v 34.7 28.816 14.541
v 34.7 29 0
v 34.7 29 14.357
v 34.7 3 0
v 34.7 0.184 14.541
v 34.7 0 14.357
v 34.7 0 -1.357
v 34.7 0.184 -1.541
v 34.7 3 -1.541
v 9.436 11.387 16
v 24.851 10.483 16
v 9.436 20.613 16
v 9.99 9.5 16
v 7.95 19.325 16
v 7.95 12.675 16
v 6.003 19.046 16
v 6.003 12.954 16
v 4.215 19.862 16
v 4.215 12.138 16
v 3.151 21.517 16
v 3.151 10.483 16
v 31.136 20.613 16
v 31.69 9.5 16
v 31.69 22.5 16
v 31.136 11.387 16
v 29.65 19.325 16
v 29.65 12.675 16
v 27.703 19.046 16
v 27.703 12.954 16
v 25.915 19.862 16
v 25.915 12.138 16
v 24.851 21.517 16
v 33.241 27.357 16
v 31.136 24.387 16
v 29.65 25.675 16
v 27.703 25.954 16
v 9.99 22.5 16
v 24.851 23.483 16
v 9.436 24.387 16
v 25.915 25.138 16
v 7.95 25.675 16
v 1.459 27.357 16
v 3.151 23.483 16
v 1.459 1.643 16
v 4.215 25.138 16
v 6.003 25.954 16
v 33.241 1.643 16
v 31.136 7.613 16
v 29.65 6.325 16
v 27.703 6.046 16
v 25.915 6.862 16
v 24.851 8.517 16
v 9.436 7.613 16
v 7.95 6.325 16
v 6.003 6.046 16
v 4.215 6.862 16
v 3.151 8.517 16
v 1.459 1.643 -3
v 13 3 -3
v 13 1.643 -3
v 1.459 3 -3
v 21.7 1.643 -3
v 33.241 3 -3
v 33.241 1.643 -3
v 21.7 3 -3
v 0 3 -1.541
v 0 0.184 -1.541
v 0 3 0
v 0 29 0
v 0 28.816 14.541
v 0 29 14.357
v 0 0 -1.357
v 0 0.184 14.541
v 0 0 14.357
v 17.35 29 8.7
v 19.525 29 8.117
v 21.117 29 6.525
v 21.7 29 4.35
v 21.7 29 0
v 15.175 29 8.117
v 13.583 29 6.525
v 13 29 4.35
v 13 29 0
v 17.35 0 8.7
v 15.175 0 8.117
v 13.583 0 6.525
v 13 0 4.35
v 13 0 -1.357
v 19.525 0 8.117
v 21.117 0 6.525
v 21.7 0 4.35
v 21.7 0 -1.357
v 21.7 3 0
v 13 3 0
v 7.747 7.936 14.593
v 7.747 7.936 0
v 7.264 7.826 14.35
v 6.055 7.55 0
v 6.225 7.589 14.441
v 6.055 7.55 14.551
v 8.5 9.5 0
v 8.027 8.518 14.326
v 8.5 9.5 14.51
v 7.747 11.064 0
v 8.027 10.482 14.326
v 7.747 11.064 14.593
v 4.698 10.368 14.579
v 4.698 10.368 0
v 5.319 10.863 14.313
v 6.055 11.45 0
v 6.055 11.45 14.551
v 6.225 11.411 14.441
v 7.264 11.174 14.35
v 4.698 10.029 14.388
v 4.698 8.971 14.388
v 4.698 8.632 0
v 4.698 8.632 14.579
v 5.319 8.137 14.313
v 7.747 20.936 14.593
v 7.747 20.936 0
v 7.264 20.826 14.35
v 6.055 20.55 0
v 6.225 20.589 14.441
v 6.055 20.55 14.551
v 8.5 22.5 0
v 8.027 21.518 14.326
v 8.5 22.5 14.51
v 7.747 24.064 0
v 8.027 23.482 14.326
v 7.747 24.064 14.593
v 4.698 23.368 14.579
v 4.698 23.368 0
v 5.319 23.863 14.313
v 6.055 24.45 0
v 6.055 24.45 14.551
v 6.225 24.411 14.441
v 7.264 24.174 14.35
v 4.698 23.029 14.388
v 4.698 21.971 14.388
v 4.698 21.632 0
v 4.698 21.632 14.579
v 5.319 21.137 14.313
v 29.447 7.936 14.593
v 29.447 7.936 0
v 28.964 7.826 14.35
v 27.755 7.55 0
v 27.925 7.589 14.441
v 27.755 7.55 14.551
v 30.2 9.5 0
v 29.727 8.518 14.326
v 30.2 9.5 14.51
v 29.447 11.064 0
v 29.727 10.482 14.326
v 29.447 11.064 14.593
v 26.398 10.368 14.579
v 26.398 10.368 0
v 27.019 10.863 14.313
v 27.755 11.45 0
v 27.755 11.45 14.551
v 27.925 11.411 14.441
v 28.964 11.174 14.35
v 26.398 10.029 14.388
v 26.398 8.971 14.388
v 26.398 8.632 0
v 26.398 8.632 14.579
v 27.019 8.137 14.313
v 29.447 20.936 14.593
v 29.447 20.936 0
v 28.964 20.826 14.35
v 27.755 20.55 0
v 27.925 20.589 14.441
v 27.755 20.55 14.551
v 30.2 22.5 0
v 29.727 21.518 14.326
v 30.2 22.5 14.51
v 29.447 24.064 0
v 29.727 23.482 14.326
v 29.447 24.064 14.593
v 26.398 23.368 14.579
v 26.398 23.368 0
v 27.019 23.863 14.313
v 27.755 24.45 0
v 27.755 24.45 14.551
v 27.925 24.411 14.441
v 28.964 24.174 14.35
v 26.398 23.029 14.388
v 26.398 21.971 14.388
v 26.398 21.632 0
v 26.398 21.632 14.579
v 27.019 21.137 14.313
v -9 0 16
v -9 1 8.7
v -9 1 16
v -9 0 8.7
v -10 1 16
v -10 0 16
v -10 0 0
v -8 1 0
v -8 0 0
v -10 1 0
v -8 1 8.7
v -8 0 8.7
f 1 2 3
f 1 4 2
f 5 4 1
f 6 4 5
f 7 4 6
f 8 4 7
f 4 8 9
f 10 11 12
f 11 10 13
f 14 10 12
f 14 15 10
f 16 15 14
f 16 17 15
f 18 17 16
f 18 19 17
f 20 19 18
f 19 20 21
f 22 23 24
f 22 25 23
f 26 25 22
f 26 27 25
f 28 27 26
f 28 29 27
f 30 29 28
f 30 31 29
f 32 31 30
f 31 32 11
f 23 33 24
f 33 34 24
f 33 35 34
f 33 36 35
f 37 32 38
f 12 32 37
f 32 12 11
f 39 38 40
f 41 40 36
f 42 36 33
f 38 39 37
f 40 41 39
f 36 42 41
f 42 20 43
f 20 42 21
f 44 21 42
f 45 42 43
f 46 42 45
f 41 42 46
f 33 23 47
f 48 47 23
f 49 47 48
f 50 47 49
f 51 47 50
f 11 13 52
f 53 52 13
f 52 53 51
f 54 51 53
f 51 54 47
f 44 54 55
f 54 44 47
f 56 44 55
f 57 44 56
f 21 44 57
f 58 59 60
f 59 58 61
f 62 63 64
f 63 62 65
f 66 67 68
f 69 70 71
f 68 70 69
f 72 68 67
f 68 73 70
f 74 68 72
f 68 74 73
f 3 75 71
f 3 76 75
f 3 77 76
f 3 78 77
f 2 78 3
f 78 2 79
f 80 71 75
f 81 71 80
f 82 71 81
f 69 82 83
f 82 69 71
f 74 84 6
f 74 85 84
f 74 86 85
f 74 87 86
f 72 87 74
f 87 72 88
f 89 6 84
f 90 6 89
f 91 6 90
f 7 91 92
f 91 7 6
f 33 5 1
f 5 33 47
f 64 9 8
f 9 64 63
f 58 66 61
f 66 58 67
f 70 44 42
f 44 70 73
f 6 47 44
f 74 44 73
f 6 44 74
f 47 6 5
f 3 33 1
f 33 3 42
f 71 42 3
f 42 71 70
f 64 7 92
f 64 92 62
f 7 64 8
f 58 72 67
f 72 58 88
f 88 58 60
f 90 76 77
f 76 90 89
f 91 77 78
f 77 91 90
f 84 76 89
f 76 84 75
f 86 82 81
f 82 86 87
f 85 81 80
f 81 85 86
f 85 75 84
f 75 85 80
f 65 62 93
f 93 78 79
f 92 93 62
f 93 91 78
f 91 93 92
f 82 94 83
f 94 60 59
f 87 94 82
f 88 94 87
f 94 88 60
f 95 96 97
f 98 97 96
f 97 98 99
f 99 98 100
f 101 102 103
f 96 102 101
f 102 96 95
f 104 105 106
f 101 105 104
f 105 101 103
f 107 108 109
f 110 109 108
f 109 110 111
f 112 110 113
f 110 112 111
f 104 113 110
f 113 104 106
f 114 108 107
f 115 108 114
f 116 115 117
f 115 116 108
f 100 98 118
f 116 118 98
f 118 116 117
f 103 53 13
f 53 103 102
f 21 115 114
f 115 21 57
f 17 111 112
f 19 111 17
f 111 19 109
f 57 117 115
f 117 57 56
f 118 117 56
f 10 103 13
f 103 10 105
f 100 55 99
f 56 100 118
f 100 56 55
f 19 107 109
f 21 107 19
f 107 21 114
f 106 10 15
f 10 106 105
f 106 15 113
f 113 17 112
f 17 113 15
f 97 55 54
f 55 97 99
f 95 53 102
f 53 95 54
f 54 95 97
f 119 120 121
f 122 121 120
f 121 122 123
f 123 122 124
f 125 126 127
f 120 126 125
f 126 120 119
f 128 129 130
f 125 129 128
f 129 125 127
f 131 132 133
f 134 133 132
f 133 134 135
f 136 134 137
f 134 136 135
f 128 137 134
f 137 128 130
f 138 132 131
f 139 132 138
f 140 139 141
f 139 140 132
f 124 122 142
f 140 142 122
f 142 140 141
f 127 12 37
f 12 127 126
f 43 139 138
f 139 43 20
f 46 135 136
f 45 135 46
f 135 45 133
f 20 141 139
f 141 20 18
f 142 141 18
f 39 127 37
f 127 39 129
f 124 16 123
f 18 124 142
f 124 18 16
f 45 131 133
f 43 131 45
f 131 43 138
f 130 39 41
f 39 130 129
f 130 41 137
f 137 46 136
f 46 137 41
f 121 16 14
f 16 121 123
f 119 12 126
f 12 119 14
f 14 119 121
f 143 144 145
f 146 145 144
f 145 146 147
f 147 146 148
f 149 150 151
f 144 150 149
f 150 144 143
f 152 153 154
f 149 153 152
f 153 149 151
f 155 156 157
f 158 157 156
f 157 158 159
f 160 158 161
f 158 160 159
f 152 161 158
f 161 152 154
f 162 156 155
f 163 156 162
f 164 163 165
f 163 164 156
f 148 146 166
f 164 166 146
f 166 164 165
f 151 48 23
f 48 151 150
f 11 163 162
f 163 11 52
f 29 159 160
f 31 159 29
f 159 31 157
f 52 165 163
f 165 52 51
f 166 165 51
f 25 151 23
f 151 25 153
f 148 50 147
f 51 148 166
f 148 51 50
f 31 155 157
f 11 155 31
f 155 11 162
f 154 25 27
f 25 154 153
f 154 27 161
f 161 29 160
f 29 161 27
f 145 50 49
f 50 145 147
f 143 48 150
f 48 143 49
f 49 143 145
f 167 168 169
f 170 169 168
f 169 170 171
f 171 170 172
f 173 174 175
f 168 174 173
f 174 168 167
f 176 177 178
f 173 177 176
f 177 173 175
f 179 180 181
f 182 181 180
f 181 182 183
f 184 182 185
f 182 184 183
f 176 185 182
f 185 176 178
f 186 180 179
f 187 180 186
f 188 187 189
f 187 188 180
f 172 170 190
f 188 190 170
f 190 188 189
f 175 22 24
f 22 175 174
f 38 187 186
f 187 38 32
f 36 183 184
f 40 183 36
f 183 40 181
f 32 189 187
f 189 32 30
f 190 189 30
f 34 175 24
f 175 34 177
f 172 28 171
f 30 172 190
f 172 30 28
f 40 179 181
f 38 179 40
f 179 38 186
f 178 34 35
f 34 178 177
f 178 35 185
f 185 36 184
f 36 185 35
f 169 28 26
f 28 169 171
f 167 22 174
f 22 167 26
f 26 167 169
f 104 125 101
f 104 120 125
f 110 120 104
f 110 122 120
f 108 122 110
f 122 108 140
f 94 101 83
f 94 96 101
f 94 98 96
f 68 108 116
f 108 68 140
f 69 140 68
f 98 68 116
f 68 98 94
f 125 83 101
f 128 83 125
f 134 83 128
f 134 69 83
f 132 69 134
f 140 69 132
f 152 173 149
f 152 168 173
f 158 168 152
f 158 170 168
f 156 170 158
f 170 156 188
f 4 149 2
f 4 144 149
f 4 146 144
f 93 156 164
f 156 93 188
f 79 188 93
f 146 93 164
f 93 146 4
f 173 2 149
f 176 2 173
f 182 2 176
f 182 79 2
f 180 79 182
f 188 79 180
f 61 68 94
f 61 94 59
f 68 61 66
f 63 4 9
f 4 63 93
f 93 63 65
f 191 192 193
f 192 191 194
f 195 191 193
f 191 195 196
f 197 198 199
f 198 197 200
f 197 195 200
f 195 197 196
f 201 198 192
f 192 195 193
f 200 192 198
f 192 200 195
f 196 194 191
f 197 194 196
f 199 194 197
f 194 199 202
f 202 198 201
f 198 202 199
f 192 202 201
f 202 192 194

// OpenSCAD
// file: inc/functions.scad
// PRUSA iteration3
// Functions used in many files
// GNU GPL v3
// Josef Průša <josefprusa@me.com>
// Václav 'ax' Hůla <axtheb@gmail.com>
// Vlnofka <>
// http://www.reprap.org/wiki/Prusa_Mendel
// http://github.com/prusajr/PrusaMendel


module nut(d,h,horizontal=true){
    cornerdiameter =  (d / 2) / cos (180 / 6);
    cylinder(h = h, r = cornerdiameter, $fn = 6);
    if(horizontal){
        for(i = [1:6]){
            rotate([0,0,60*i]) translate([-cornerdiameter-0.2,0,0]) rotate([0,0,-45]) cube([2,2,h]);
        }
    }
}

// Based on nophead research
module polyhole(d, h, center=false) {
    n = max(round(2 * d),3);
    rotate([0,0,180])
        cylinder(h = h, r = (d / 2) / cos (180 / n), $fn = n);
}

// make it interchangeable between this and cylinder
module cylinder_poly(r, h, center=false){
    polyhole(d=r*2, h=h, center=center);
}

module fillet(radius, height=100, $fn=0) {
    //this creates acutal fillet
    translate([-radius, -radius, -height/2-0.01])
        difference() {
            cube([radius*2, radius*2, height+0.02]);
            cylinder(r=radius, h=height+0.02, $fn=$fn);
        }
}

module cube_fillet(size, radius=-1, vertical=[3,3,3,3], top=[0,0,0,0], bottom=[0,0,0,0], center=false, $fn=0){
    //
    if (center) {
        cube_fillet_inside(size, radius, vertical, top, bottom, $fn);
    } else {
        translate([size[0]/2, size[1]/2, size[2]/2])
            cube_fillet_inside(size, radius, vertical, top, bottom, $fn);
    }
}

module cube_negative_fillet(size, radius=-1, vertical=[3,3,3,3], top=[0,0,0,0], bottom=[0,0,0,0], $fn=0){

    j=[1,0,1,0];

    for (i=[0:3]) {
        if (radius > -1) {
            rotate([0, 0, 90*i]) translate([size[1-j[i]]/2, size[j[i]]/2, 0]) fillet(radius, size[2], $fn=$fn);
        } else {
            rotate([0, 0, 90*i]) translate([size[1-j[i]]/2, size[j[i]]/2, 0]) fillet(vertical[i], size[2], $fn=$fn);
        }
        rotate([90*i, -90, 0]) translate([size[2]/2, size[j[i]]/2, 0 ]) fillet(top[i], size[1-j[i]], $fn=$fn);
        rotate([90*(4-i), 90, 0]) translate([size[2]/2, size[j[i]]/2, 0]) fillet(bottom[i], size[1-j[i]], $fn=$fn);

    }
}

module cube_fillet_inside(size, radius=-1, vertical=[3,3,3,3], top=[0,0,0,0], bottom=[0,0,0,0], $fn=0){
    //makes CENTERED cube with round corners
    // if you give it radius, it will fillet vertical corners.
    //othervise use vertical, top, bottom arrays
    //when viewed from top, it starts in upper right corner (+x,+y quadrant) , goes counterclockwise
    //top/bottom fillet starts in direction of Y axis and goes CCW too


    if (radius == 0) {
        cube(size, center=true);
    } else {
        difference() {
            cube(size, center=true);
            cube_negative_fillet(size, radius, vertical, top, bottom, $fn);
        }
    }
}


module nema17(places=[1,1,1,1], size=15.5, h=10, holes=false, shadow=false, $fn=24){
    for (i=[0:3]) {
        if (places[i] == 1) {
            rotate([0, 0, 90*i]) translate([size, size, 0]) {
                if (holes) {
                    #rotate([0, 0, -90*i])  translate([0,0,-10]) screw(r=1.7, slant=false, head_drop=13, $fn=$fn, h=h+12);
                } else {
                    rotate([0, 0, -90*i]) cylinder(h=h, r=5.5, $fn=$fn);
                }
            }
        }
    }
    if (shadow != false) {
        %translate ([0, 0, shadow+21+3]) cube([42,42,42], center = true);
    //flange
        %translate ([0, 0, shadow+21+3-21-1]) cylinder(r=11,h=2, center = true, $fn=20);
    //shaft
        %translate ([0, 0, shadow+21+3-21-7]) cylinder(r=2.5,h=14, center = true);
    }
}

module screw(h=20, r=2, r_head=3.5, head_drop=0, slant=true, poly=false, $fn=0){
    //makes screw with head
    //for substraction as screw hole
    if (poly) {
        cylinder_poly(h=h, r=r, $fn=$fn);
    } else {
        cylinder(h=h, r=r, $fn=$fn);
    }
    if (slant) {
        translate([0, 0, head_drop-0.01]) cylinder(h=r_head, r2=0, r1=r_head, $fn=$fn);
    }

    if (head_drop > 0) {
        translate([0, 0, -0.01]) cylinder(h=head_drop+0.01, r=r_head, $fn=$fn);
    }
}

//cube_fillet([10,20,30], vertical=[3,2,0,0], top=[3,2,0,5], bottom=[3,2,0,5]);
//cube_fillet([10,20,30], radius=2, top=[7,2,7,2]);
// file: inc/metric.scad
// PRUSA iteration3
// Default metric sizes
// GNU GPL v3
// Josef Průša <josefprusa@me.com>
// http://www.reprap.org/wiki/Prusa_Mendel
// http://github.com/prusajr/PrusaMendel

// DONT CHANGE THIS FILE! ALTER VALUES IN CONFIGURATION.SCAD INSTEAD

// RODS

threaded_rod_diameter = 8.7;
threaded_rod_diameter_horizontal = 8.7;
smooth_bar_diameter = 8;
smooth_bar_diameter_horizontal = 8.5;

// Nuts and bolts

m8_diameter = 9;
m8_nut_diameter = 14.1;

m4_diameter = 4.5;
m4_nut_diameter = 9;

m3_diameter = 3.6;
m3_nut_diameter = 5.3;
m3_nut_diameter_horizontal = 6.1;

// Bushing holder

bushing_core_diameter = smooth_bar_diameter;
bushing_material_thickness = 1;

// Motors

motor_shaft = 5.5;
// file: configuration.scad
// PRUSA Mendel  
// Configuration file
// GNU GPL v3
// Josef Průša
// josefprusa@me.com
// prusadjs.cz
// http://www.reprap.org/wiki/Prusa_Mendel
// http://github.com/prusajr/PrusaMendel

// PLEASE SELECT ONE OF THE CONFIGURATIONS BELOW
// BY UN-COMMENTING IT

// Uncomment for metric settings
// METRIC METRIC METRIC METRIC METRIC METRIC METRIC METRIC 

include <inc/metric.scad>;

// CUSTOM CUSTOM CUSTOM CUSTOM CUSTOM CUSTOM CUSTOM CUSTOM CUSTOM

thin_wall = 3;


// Linear bearing version
linear = false;
// set false for LM-8UU, true for LM-E-8UU (ignore if linear is set to false)
lme8uu = false;

//Machine dimensions

board_thickness = 16;
board_to_xz_distance = 26;

belt_tooth_distance = 2.5;
belt_tooth_stride = 0.5;

// CHANGE ONLY THE STUFF YOU KNOW
// IT WILL REPLACE DEFAULT SETTING

// RODS

// threaded_rod_diameter = 0;
// threaded_rod_diameter_horizontal = 0;
// smooth_bar_diameter = 0;
// smooth_bar_diameter_horizontal = 0;

// Nuts and bolts

// m8_diameter = 0;
// m8_nut_diameter = 0;

// m4_diameter = 0;
// m4_nut_diameter = 0;

// m3_diameter = 0;
// m3_nut_diameter = 0;

// Bushing holder

// bushing_core_diameter = smooth_bar_diameter;
// bushing_material_thickness = 0;


///counted stuff
m3_nut_diameter_bigger = ((m3_nut_diameter  / 2) / cos (180 / 6))*2;

// functions
include <inc/functions.scad>
// main file
include <configuration.scad>

module boltTrack(width, length, height) {
	hwidth = width / 2;
	hdiff = hwidth - height;
	union() {
		difference() {
			rotate([90, 0, 0])
				translate([hwidth, height, -length])
					cylinder(h=length, r=hwidth, $fn=12);
			
			if (height < hwidth) {
				translate([0, -1, height - hwidth - 1])
					cube([width, length + 2, hdiff + 1]);
			}
		}
		cube([width, length, height]);
	}
}


module yrodbracket(lip_thickness, lip_length) {
	innerRadius = threaded_rod_diameter / 2;
	outerRadius = innerRadius + lip_thickness;
	r_head = 3.5; // FIXME: stolen from screw() in inc/functions.scad
	r_screw = 2;
	screw_margin = r_head + 2;
	holeOuterDiameter = r_screw + screw_margin * 2;
	holeCenter = holeOuterDiameter / 2;
	width = threaded_rod_diameter + holeOuterDiameter * 2;
	middle = width / 2;
	height = outerRadius + innerRadius;

	depth = holeOuterDiameter * 2 + lip_thickness;

	function pythag(a, b) = sqrt(a * a + b * b);
	function bevelradius(x, y, bevel) = pythag(x, y) - bevel * max(x, y) / min(x, y);

	xzbevel = bevelradius(width, board_thickness, 2.0);
	yzbevel = bevelradius(depth, board_thickness, 2.0);
	difference() {
		union() {
			intersection() {
				cube([width, depth, board_thickness]);
				translate([width / 2, depth / 2, board_thickness / 2])
					rotate([0, 45, 0])
						cube([xzbevel, depth, xzbevel], center=true);
				translate([width / 2, depth / 2, board_thickness / 2])
					rotate([45, 0, 0])
						cube([width, yzbevel, yzbevel], center=true);
						
			}
			translate([0, 0, -lip_length])
				cube([width, lip_thickness, lip_length + lip_thickness]);
		}
		translate([holeOuterDiameter, -1, -lip_length - lip_thickness])
			boltTrack(threaded_rod_diameter, depth + 2, lip_length + lip_thickness + innerRadius);

		// screw holes
		for (x = [holeCenter, width - holeCenter]) {
			for (y = [lip_thickness + holeCenter, holeOuterDiameter + lip_thickness + holeCenter]) {
				translate([x, y, board_thickness])
					rotate([180, 0, 0])
						screw();
			}
		}
	}
}

module yrodbracket2(lip_thickness, lip_length) {
	innerRadius = threaded_rod_diameter / 2;
	outerRadius = innerRadius + lip_thickness;
	r_head = 3.5; // FIXME: stolen from screw() in inc/functions.scad
	r_screw = 2;
	screw_margin = r_head + 2;
	holeOuterDiameter = r_screw + screw_margin * 2;
	holeCenter = holeOuterDiameter / 2;
	width = threaded_rod_diameter + holeOuterDiameter * 2;
	middle = width / 2;
	height = outerRadius + innerRadius;

	depth = holeOuterDiameter * 2 + lip_thickness;

	function pythag(a, b) = sqrt(a * a + b * b);
	function bevelradius(x, y, bevel) = pythag(x, y) - bevel * max(x, y) / min(x, y);

	xzbevel = bevelradius(width, board_thickness + lip_length, 2.0);
	yzbevel = bevelradius(depth, board_thickness + lip_length, 2.0);
	bracket_thickness = board_thickness + lip_length;
	difference() {
		union() {
			intersection() {
				translate([0, 0, -lip_length])
					cube([width, depth, bracket_thickness]);
				translate([width / 2, depth / 2, bracket_thickness / 2 - lip_length])
					rotate([0, 45, 0])
						cube([xzbevel, depth, xzbevel], center=true);
				translate([width / 2, depth / 2, bracket_thickness / 2 - lip_length])
					rotate([45, 0, 0])
						cube([width, yzbevel, yzbevel], center=true);
			}
		}
		translate([holeOuterDiameter, -1, -lip_length - lip_thickness])
			boltTrack(threaded_rod_diameter, depth + 2, lip_length + lip_thickness + innerRadius);

		translate([-1, lip_thickness, -lip_length - 1])
			cube([width + 2, depth, lip_length + 1]);

		// screw holes
		for (x = [holeCenter, width - holeCenter]) {
			for (y = [lip_thickness + holeCenter, holeOuterDiameter + lip_thickness + holeCenter]) {
				translate([x, y, board_thickness])
					rotate([180, 0, 0])
						screw();
			}
		}
	}
}

translate([-10, 0, 0])
	color("blue")
		cube([1, 1, board_thickness]); // xxx: ruler
translate([-9, 0, 0])
	color("Red")
		cube([1, 1, threaded_rod_diameter]); // xxx: ruler

yrodbracket2(3, 3);
//rotate([90, 0, 0])
	//translate([3.5 + 6 + 3 + threaded_rod_diameter / 2, threaded_rod_diameter / 2, -50])
		//# cylinder(r=threaded_rod_diameter / 2, h=100);
